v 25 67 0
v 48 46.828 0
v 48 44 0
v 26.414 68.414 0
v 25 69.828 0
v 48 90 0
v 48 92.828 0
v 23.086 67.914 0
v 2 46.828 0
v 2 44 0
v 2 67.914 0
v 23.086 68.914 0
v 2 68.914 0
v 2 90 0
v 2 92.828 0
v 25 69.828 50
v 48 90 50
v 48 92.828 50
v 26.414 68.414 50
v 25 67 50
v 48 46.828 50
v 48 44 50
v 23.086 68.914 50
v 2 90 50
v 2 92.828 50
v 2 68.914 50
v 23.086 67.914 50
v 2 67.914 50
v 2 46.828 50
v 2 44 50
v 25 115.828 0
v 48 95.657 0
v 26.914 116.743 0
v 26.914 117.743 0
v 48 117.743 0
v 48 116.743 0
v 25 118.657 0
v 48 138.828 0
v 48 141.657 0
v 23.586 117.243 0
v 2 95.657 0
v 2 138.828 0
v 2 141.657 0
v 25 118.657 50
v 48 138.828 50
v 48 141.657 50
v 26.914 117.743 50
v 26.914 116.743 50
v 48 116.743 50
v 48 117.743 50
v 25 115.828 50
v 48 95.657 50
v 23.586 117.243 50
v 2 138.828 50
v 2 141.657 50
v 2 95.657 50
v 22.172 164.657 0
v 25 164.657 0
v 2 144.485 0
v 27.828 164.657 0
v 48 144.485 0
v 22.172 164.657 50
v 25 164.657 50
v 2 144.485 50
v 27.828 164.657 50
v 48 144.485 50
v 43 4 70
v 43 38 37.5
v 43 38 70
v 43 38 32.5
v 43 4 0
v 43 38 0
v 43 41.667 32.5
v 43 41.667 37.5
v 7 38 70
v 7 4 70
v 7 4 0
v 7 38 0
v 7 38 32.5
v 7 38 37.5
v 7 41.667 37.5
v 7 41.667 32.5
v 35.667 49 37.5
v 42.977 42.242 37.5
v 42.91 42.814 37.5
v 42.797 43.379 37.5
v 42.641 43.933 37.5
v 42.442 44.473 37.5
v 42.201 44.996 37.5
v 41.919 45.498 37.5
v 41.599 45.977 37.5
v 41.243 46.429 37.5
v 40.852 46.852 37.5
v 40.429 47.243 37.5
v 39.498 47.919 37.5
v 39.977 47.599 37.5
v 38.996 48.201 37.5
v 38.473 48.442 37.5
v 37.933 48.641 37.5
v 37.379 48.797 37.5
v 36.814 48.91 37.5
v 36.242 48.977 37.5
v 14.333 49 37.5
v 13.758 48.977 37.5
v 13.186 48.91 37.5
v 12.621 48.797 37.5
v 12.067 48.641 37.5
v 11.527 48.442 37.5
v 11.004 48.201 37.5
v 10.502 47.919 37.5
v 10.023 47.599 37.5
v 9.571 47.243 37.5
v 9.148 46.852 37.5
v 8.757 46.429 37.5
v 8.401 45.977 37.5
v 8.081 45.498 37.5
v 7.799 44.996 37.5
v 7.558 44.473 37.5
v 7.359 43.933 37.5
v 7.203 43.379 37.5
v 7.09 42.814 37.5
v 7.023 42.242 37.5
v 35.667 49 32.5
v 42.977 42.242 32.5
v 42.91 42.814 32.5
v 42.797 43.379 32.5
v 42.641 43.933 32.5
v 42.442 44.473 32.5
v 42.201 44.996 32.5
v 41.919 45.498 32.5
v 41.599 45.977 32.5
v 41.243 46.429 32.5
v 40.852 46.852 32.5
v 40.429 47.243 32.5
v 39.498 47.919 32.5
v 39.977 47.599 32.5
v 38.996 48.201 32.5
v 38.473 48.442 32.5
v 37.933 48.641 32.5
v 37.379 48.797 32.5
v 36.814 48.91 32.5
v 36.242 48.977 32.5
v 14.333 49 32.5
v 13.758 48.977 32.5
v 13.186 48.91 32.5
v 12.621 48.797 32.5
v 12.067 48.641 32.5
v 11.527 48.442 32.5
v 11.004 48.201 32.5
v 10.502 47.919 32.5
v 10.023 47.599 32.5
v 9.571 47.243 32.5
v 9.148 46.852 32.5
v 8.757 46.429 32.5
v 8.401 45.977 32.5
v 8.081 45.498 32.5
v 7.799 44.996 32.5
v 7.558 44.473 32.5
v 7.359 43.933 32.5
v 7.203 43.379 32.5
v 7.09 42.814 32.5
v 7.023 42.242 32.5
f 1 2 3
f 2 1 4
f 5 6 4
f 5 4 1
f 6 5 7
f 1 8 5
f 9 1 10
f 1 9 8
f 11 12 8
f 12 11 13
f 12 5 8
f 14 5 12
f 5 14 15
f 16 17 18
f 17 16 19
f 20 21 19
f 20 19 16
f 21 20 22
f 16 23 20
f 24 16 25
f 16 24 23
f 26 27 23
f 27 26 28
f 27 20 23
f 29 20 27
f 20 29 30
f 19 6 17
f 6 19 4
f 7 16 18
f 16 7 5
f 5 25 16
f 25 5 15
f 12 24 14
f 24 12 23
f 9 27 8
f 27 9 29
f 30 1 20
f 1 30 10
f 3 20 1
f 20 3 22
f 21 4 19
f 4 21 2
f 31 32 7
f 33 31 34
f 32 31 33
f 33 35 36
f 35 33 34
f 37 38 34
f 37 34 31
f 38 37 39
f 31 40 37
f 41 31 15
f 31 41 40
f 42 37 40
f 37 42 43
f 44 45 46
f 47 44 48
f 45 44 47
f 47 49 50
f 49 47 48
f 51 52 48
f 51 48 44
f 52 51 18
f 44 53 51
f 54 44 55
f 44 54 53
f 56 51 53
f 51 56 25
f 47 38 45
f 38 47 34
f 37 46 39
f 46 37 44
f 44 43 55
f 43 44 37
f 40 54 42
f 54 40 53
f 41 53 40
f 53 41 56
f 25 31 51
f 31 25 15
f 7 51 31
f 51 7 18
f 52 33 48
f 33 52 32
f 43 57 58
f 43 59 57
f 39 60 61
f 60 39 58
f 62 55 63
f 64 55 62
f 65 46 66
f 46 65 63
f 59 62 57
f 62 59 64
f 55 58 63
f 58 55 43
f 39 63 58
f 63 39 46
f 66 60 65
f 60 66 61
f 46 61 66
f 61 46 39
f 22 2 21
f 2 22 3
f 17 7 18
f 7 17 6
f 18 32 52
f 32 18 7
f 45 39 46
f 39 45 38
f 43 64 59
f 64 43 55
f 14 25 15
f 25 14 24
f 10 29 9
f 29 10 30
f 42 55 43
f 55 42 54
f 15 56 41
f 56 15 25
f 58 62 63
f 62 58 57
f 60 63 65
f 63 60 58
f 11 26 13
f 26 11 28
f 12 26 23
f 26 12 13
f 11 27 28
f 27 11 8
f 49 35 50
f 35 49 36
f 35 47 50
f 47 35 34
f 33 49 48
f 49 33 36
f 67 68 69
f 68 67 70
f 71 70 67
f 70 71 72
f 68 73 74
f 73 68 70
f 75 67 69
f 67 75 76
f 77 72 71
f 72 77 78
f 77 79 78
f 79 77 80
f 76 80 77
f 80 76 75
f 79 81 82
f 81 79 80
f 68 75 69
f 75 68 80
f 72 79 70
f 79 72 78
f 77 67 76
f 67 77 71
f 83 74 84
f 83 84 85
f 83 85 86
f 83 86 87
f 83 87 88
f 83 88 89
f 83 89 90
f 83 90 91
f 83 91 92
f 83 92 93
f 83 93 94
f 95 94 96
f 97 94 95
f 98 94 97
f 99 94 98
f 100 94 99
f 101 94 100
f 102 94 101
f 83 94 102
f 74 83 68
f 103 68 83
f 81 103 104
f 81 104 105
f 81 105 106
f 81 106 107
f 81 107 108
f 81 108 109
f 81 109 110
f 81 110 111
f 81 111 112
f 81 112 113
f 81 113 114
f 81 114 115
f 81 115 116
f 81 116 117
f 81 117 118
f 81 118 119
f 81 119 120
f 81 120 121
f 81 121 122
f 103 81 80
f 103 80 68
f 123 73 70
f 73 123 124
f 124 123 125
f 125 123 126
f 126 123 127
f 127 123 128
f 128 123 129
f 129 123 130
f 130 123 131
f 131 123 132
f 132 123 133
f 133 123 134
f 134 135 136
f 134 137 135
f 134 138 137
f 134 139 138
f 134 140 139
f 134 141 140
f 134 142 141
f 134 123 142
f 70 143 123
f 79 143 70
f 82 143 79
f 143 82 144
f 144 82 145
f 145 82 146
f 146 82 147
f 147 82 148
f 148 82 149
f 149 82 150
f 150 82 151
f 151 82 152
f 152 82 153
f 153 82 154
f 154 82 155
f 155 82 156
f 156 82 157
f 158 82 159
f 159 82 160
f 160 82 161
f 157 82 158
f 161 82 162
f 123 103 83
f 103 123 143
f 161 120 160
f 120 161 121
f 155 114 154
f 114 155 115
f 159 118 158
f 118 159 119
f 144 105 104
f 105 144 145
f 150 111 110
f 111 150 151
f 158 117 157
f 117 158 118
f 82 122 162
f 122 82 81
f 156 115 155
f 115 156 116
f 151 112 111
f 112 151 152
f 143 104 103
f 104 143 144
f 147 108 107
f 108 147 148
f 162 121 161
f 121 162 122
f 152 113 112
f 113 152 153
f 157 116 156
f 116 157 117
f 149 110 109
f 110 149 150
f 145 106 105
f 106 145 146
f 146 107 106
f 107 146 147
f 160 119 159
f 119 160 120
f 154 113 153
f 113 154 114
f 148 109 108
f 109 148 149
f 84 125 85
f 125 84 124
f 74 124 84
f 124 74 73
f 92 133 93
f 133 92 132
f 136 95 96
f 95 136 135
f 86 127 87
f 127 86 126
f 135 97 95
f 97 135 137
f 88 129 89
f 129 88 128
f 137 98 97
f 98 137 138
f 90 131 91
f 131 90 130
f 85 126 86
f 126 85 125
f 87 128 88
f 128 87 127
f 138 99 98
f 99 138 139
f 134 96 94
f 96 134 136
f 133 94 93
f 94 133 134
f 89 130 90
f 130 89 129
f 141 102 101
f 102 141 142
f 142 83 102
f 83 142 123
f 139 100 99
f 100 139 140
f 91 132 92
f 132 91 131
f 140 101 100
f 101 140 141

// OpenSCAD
width = 50;

ext_depth = 50;
ext_thickness = 2;

int_depth = 50;
int_thickness = 2;

feet_length = 2;

hardener_width = 5;

bridge_width = 50;
bridge_height = 50+ext_thickness;

fence_width = 4;

shelf_thickness = 1;

cross_count = 2.5;

ext_width = width;
int_width = width - 2*ext_thickness;
//base_length = int_width/1.6;
//base_length = int_width;
base_length = 40;
height = feet_length + 2*ext_thickness + base_length + int_width * cross_count + int_thickness*sqrt(2) * (cross_count-0.5);

module hardener() {
    color("orange")
    translate([0,0,-ext_thickness])
    linear_extrude(ext_thickness)
    translate([0,-hardener_width/2,0])
    square([ext_width, hardener_width]);
}

module fence() {
    square([fence_width, fence_width]);
}

module internal_cross() {
    color("lightblue")
    translate([0,0,(ext_depth-int_depth)/2])
    linear_extrude(int_depth) {
        translate([width/2,int_width/2,0])
        rotate([0, 0, 45]) {
            translate([-int_width * sqrt(2) / 2 - int_thickness/2, -int_thickness/2])
                square([int_width * sqrt(2) + int_thickness, int_thickness]);
            translate([-int_thickness/2, -int_width * sqrt(2) / 2 - int_thickness/2])
                square([int_thickness, int_width * sqrt(2) + int_thickness]);
        }
    }
}

module internal_shelf() {
    cube([int_width/2,shelf_thickness, int_depth]);
}

module frame() {
    
    color("lightgreen")
    linear_extrude(ext_depth) {
        // Sides
        square([ext_thickness, height]);
        translate([width - ext_thickness, 0])
            square([ext_thickness, height]);
        
        // Extra feet
        translate([ext_width/2 - ext_thickness/2, 0])
            square([ext_thickness, feet_length]);
    
        // Bottom
        translate([ext_thickness, feet_length])
            square([int_width, ext_thickness]);
        
        // top
        translate([0, height-ext_thickness])
            square([ext_width, ext_thickness]);
    }
}

module internal() {
    color("lightblue")
    render(convexity = 1)
    intersection() {
        // n internal crosses
        for(y = [feet_length+ext_thickness+base_length + int_thickness * sqrt(2)/2 : int_width +int_thickness * sqrt(2) : height-ext_thickness]) {
            // Internal cross
            translate([0,y,0]){
                internal_cross();                
            }
        }
        
        translate([ext_thickness, feet_length+ext_thickness,-10])
            cube([int_width,height-feet_length-2*ext_thickness,ext_depth+20]);
    }
    
    // Left shelf
    translate([ext_thickness,feet_length+ext_thickness+base_length+int_width/2-shelf_thickness/2 + int_thickness*sqrt(2)/2 ,0])
        internal_shelf();
    
    // Right shelf
    translate([ext_thickness+int_width/2,feet_length+ext_thickness+base_length+int_width/2-shelf_thickness/2 + 3*int_thickness*sqrt(2)/2 + int_width ,0])
        internal_shelf();
}

module hardeners() {   
    // n hardener
    for(y = [feet_length+ext_thickness+base_length : int_width + int_thickness * sqrt(2) : height-hardener_width]) {
        translate([0,y,0])
            hardener();
    }
}

module side_bridge() {
    color("lightgrey")
    linear_extrude(ext_depth) {
        translate([-bridge_width,0,0]) {
            // Side
            square([ext_thickness, bridge_height]);
            
            // Top
            translate([0,bridge_height-ext_thickness,0])
                square([bridge_width, ext_thickness]);
            
            // Bottom
            translate([0,feet_length,0])
                square([bridge_width, ext_thickness]);
        }
        
        // Mid foot
        translate([-bridge_width/2-ext_thickness/2,0,0])
            square([ext_thickness, feet_length]);
    }
    
    // Fences
}

module panier() {
    l = 36;
    L = 70;
    h1 = 34;
    h2 = 45;
    ance_largeur = 5;
    ance_radius = (h2 - h1)*2/3;
    p = 80;
    color("brown")
    translate([width/2-l/2, feet_length + ext_thickness,0]) {
        // base
        cube([l,h1,L]);
        
        // ance
        translate([0, h1,L/2-ance_largeur/2])
            cube([l,(h2-h1)-ance_radius,ance_largeur]);
        translate([ance_radius, h1+(h2-h1)-ance_radius,L/2-ance_largeur/2])
            cube([l-2*ance_radius,ance_radius,ance_largeur]);
        translate([ance_radius, h1+(h2-h1)-ance_radius,L/2-ance_largeur/2])
            cylinder(ance_largeur,ance_radius,ance_radius,$fn=p);
        translate([l-ance_radius, h1+(h2-h1)-ance_radius,L/2-ance_largeur/2])
            cylinder(ance_largeur,ance_radius,ance_radius,$fn=p);
    }
}

frame();
internal();
//hardeners();
//side_bridge();

panier();
